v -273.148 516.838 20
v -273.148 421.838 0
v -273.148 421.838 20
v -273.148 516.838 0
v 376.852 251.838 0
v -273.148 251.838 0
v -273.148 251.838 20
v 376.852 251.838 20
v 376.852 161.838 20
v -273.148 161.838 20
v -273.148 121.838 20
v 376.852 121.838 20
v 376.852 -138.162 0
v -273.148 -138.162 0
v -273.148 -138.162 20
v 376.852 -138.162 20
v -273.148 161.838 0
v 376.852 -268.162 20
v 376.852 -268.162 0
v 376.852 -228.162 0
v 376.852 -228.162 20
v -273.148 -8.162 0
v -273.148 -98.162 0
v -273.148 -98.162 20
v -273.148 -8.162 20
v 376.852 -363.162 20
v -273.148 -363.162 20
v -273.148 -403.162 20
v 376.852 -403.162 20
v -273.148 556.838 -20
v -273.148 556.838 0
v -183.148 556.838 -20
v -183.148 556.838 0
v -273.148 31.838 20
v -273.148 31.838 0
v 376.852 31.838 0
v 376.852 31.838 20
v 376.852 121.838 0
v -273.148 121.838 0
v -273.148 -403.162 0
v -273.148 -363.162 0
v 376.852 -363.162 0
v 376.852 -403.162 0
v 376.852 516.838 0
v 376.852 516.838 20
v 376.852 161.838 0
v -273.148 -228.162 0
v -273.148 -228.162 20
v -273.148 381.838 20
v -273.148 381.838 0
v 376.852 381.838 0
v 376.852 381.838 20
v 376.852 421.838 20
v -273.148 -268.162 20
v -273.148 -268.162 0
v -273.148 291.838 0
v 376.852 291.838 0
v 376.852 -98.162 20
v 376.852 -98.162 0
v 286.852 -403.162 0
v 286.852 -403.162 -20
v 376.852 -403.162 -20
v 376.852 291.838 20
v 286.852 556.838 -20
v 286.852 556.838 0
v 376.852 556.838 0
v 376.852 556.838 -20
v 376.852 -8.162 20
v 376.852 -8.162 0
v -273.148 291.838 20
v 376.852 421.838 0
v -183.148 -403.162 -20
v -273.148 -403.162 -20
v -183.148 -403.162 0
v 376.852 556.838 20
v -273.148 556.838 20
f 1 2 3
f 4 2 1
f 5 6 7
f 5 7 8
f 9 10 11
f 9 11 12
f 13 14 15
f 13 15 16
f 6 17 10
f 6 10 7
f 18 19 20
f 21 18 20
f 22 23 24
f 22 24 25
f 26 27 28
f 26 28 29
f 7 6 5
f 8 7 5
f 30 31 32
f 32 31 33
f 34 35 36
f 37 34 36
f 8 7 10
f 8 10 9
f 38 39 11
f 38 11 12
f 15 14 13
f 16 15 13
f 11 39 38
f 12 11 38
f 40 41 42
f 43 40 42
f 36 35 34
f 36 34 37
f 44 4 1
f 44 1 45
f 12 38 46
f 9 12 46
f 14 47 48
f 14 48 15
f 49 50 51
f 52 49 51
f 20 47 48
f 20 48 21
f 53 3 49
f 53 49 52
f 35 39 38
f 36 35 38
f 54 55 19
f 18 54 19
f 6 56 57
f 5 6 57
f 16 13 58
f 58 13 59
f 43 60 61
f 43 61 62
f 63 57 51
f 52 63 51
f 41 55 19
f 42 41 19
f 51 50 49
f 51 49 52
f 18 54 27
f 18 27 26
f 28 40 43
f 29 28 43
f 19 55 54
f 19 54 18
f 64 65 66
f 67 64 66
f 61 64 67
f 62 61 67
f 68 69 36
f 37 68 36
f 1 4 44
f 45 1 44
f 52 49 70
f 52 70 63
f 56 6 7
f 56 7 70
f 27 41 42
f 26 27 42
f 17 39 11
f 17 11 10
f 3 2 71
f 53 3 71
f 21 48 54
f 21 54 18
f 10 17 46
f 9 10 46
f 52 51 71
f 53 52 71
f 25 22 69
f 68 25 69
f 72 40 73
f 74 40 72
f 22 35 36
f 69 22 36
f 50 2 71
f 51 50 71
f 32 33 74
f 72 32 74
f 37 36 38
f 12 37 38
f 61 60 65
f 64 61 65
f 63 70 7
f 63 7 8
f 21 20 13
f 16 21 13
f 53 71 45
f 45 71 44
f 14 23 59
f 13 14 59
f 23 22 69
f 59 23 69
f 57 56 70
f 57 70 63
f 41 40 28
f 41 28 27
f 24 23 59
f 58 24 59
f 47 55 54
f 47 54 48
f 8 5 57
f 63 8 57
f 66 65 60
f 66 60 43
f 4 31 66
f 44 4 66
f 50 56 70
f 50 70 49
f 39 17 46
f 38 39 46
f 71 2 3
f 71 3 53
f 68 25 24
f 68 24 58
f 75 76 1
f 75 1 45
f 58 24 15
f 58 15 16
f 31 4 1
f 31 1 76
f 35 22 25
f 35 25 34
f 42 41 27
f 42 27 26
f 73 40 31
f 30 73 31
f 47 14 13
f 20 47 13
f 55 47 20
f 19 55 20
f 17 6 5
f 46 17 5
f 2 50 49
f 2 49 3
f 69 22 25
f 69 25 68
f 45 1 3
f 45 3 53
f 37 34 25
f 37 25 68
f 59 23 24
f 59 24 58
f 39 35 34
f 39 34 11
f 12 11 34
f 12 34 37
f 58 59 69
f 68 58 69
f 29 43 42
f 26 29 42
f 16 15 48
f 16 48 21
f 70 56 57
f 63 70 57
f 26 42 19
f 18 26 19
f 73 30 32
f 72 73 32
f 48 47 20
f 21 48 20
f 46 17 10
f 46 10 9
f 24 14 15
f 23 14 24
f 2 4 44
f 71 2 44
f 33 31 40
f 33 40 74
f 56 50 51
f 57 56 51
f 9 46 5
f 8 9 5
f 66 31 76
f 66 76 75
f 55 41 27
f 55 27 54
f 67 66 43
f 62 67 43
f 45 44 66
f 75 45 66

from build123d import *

# Parameters (mm, degrees)
F0_W     = 650
F0_H     = 40
F1_DEPTH = 20
F0_H_2   = 95
F2_DEPTH = 20
F0_H_3   = 90
F3_W     = 90
F3_H     = 175
F3_H_2   = 90
F3_H_3   = 695
F4_DEPTH = 20


with BuildPart() as f1:
    # F0 (on Top) → F1 (new body)
    with BuildSketch(Plane.XY):
        with Locations((51.8519654549, 536.8375853449)):
            Rectangle(F0_W, F0_H)
    extrude(amount=F1_DEPTH)


with BuildPart() as f1b:
    # F0 (on Top) → F1, piece 2 (new body)
    with BuildSketch(Plane.XY):
        with Locations((51.8519654549, 401.8375853449)):
            Rectangle(F0_W, F0_H)
    extrude(amount=F1_DEPTH)


with BuildPart() as f1c:
    # F0 (on Top) → F1, piece 3 (new body)
    with BuildSketch(Plane.XY):
        with Locations((51.8519654549, 271.8375853449)):
            Rectangle(F0_W, F0_H)
    extrude(amount=F1_DEPTH)


with BuildPart() as f1d:
    # F0 (on Top) → F1, piece 4 (new body)
    with BuildSketch(Plane.XY):
        with Locations((51.8519654549, 141.8375853449)):
            Rectangle(F0_W, F0_H)
    extrude(amount=F1_DEPTH)


with BuildPart() as f1e:
    # F0 (on Top) → F1, piece 5 (new body)
    with BuildSketch(Plane.XY):
        with Locations((51.8519654549, 11.8375853449)):
            Rectangle(F0_W, F0_H)
    extrude(amount=F1_DEPTH)


with BuildPart() as f1f:
    # F0 (on Top) → F1, piece 6 (new body)
    with BuildSketch(Plane.XY):
        with Locations((51.8519654549, -118.1624146551)):
            Rectangle(F0_W, F0_H)
    extrude(amount=F1_DEPTH)


with BuildPart() as f1g:
    # F0 (on Top) → F1, piece 7 (new body)
    with BuildSketch(Plane.XY):
        with Locations((51.8519654549, -248.1624146551)):
            Rectangle(F0_W, F0_H)
    extrude(amount=F1_DEPTH)


with BuildPart() as f1h:
    # F0 (on Top) → F1, piece 8 (new body)
    with BuildSketch(Plane.XY):
        with Locations((51.8519654549, -383.1624146551)):
            Rectangle(F0_W, F0_H)
    extrude(amount=F1_DEPTH)


with BuildPart() as f2:
    # F0 (on Top) → F2 (new body)
    with BuildSketch(Plane.XY):
        with Locations((51.8519654549, 469.3375853449)):
            Rectangle(F0_W, F0_H_2)
    extrude(amount=F2_DEPTH)


with BuildPart() as f2b:
    # F0 (on Top) → F2, piece 2 (new body)
    with BuildSketch(Plane.XY):
        with Locations((51.8519654549, 336.8375853449)):
            Rectangle(F0_W, F0_H_3)
    extrude(amount=F2_DEPTH)


with BuildPart() as f2c:
    # F0 (on Top) → F2, piece 3 (new body)
    with BuildSketch(Plane.XY):
        with Locations((51.8519654549, 206.8375853449)):
            Rectangle(F0_W, F0_H_3)
    extrude(amount=F2_DEPTH)


with BuildPart() as f2d:
    # F0 (on Top) → F2, piece 4 (new body)
    with BuildSketch(Plane.XY):
        with Locations((51.8519654549, 76.8375853449)):
            Rectangle(F0_W, F0_H_3)
    extrude(amount=F2_DEPTH)


with BuildPart() as f2e:
    # F0 (on Top) → F2, piece 5 (new body)
    with BuildSketch(Plane.XY):
        with Locations((51.8519654549, -53.1624146551)):
            Rectangle(F0_W, F0_H_3)
    extrude(amount=F2_DEPTH)


with BuildPart() as f2f:
    # F0 (on Top) → F2, piece 6 (new body)
    with BuildSketch(Plane.XY):
        with Locations((51.8519654549, -183.1624146551)):
            Rectangle(F0_W, F0_H_3)
    extrude(amount=F2_DEPTH)


with BuildPart() as f2g:
    # F0 (on Top) → F2, piece 7 (new body)
    with BuildSketch(Plane.XY):
        with Locations((51.8519654549, -315.6624146551)):
            Rectangle(F0_W, F0_H_2)
    extrude(amount=F2_DEPTH)


with BuildPart() as f4:
    # F3 (on face) → F4 (new body)
    with BuildSketch(Plane(origin=(0, 0, 0), x_dir=(1, 0, 0), z_dir=(0, 0, -1))):
        with Locations((331.8519654549, -469.3375853449)):
            Rectangle(F3_W, F3_H)
        with Locations((331.8519654549, -336.8375853449)):
            Rectangle(F3_W, F3_H_2)
        with Locations((331.8519654549, 55.6624146551)):
            Rectangle(F3_W, F3_H_3)
    extrude(amount=F4_DEPTH)


with BuildPart() as f4b:
    # F3 (on face) → F4, piece 2 (new body)
    with BuildSketch(Plane(origin=(0, 0, 0), x_dir=(1, 0, 0), z_dir=(0, 0, -1))):
        with Locations((-228.1480345451, 55.6624146551)):
            Rectangle(F3_W, F3_H_3)
        with Locations((-228.1480345451, -336.8375853449)):
            Rectangle(F3_W, F3_H_2)
        with Locations((-228.1480345451, -469.3375853449)):
            Rectangle(F3_W, F3_H)
    extrude(amount=F4_DEPTH)


solid = Compound([f1.part, f1b.part, f1c.part, f1d.part, f1e.part, f1f.part, f1g.part, f1h.part, f2.part, f2b.part, f2c.part, f2d.part, f2e.part, f2f.part, f2g.part, f4.part, f4b.part])
